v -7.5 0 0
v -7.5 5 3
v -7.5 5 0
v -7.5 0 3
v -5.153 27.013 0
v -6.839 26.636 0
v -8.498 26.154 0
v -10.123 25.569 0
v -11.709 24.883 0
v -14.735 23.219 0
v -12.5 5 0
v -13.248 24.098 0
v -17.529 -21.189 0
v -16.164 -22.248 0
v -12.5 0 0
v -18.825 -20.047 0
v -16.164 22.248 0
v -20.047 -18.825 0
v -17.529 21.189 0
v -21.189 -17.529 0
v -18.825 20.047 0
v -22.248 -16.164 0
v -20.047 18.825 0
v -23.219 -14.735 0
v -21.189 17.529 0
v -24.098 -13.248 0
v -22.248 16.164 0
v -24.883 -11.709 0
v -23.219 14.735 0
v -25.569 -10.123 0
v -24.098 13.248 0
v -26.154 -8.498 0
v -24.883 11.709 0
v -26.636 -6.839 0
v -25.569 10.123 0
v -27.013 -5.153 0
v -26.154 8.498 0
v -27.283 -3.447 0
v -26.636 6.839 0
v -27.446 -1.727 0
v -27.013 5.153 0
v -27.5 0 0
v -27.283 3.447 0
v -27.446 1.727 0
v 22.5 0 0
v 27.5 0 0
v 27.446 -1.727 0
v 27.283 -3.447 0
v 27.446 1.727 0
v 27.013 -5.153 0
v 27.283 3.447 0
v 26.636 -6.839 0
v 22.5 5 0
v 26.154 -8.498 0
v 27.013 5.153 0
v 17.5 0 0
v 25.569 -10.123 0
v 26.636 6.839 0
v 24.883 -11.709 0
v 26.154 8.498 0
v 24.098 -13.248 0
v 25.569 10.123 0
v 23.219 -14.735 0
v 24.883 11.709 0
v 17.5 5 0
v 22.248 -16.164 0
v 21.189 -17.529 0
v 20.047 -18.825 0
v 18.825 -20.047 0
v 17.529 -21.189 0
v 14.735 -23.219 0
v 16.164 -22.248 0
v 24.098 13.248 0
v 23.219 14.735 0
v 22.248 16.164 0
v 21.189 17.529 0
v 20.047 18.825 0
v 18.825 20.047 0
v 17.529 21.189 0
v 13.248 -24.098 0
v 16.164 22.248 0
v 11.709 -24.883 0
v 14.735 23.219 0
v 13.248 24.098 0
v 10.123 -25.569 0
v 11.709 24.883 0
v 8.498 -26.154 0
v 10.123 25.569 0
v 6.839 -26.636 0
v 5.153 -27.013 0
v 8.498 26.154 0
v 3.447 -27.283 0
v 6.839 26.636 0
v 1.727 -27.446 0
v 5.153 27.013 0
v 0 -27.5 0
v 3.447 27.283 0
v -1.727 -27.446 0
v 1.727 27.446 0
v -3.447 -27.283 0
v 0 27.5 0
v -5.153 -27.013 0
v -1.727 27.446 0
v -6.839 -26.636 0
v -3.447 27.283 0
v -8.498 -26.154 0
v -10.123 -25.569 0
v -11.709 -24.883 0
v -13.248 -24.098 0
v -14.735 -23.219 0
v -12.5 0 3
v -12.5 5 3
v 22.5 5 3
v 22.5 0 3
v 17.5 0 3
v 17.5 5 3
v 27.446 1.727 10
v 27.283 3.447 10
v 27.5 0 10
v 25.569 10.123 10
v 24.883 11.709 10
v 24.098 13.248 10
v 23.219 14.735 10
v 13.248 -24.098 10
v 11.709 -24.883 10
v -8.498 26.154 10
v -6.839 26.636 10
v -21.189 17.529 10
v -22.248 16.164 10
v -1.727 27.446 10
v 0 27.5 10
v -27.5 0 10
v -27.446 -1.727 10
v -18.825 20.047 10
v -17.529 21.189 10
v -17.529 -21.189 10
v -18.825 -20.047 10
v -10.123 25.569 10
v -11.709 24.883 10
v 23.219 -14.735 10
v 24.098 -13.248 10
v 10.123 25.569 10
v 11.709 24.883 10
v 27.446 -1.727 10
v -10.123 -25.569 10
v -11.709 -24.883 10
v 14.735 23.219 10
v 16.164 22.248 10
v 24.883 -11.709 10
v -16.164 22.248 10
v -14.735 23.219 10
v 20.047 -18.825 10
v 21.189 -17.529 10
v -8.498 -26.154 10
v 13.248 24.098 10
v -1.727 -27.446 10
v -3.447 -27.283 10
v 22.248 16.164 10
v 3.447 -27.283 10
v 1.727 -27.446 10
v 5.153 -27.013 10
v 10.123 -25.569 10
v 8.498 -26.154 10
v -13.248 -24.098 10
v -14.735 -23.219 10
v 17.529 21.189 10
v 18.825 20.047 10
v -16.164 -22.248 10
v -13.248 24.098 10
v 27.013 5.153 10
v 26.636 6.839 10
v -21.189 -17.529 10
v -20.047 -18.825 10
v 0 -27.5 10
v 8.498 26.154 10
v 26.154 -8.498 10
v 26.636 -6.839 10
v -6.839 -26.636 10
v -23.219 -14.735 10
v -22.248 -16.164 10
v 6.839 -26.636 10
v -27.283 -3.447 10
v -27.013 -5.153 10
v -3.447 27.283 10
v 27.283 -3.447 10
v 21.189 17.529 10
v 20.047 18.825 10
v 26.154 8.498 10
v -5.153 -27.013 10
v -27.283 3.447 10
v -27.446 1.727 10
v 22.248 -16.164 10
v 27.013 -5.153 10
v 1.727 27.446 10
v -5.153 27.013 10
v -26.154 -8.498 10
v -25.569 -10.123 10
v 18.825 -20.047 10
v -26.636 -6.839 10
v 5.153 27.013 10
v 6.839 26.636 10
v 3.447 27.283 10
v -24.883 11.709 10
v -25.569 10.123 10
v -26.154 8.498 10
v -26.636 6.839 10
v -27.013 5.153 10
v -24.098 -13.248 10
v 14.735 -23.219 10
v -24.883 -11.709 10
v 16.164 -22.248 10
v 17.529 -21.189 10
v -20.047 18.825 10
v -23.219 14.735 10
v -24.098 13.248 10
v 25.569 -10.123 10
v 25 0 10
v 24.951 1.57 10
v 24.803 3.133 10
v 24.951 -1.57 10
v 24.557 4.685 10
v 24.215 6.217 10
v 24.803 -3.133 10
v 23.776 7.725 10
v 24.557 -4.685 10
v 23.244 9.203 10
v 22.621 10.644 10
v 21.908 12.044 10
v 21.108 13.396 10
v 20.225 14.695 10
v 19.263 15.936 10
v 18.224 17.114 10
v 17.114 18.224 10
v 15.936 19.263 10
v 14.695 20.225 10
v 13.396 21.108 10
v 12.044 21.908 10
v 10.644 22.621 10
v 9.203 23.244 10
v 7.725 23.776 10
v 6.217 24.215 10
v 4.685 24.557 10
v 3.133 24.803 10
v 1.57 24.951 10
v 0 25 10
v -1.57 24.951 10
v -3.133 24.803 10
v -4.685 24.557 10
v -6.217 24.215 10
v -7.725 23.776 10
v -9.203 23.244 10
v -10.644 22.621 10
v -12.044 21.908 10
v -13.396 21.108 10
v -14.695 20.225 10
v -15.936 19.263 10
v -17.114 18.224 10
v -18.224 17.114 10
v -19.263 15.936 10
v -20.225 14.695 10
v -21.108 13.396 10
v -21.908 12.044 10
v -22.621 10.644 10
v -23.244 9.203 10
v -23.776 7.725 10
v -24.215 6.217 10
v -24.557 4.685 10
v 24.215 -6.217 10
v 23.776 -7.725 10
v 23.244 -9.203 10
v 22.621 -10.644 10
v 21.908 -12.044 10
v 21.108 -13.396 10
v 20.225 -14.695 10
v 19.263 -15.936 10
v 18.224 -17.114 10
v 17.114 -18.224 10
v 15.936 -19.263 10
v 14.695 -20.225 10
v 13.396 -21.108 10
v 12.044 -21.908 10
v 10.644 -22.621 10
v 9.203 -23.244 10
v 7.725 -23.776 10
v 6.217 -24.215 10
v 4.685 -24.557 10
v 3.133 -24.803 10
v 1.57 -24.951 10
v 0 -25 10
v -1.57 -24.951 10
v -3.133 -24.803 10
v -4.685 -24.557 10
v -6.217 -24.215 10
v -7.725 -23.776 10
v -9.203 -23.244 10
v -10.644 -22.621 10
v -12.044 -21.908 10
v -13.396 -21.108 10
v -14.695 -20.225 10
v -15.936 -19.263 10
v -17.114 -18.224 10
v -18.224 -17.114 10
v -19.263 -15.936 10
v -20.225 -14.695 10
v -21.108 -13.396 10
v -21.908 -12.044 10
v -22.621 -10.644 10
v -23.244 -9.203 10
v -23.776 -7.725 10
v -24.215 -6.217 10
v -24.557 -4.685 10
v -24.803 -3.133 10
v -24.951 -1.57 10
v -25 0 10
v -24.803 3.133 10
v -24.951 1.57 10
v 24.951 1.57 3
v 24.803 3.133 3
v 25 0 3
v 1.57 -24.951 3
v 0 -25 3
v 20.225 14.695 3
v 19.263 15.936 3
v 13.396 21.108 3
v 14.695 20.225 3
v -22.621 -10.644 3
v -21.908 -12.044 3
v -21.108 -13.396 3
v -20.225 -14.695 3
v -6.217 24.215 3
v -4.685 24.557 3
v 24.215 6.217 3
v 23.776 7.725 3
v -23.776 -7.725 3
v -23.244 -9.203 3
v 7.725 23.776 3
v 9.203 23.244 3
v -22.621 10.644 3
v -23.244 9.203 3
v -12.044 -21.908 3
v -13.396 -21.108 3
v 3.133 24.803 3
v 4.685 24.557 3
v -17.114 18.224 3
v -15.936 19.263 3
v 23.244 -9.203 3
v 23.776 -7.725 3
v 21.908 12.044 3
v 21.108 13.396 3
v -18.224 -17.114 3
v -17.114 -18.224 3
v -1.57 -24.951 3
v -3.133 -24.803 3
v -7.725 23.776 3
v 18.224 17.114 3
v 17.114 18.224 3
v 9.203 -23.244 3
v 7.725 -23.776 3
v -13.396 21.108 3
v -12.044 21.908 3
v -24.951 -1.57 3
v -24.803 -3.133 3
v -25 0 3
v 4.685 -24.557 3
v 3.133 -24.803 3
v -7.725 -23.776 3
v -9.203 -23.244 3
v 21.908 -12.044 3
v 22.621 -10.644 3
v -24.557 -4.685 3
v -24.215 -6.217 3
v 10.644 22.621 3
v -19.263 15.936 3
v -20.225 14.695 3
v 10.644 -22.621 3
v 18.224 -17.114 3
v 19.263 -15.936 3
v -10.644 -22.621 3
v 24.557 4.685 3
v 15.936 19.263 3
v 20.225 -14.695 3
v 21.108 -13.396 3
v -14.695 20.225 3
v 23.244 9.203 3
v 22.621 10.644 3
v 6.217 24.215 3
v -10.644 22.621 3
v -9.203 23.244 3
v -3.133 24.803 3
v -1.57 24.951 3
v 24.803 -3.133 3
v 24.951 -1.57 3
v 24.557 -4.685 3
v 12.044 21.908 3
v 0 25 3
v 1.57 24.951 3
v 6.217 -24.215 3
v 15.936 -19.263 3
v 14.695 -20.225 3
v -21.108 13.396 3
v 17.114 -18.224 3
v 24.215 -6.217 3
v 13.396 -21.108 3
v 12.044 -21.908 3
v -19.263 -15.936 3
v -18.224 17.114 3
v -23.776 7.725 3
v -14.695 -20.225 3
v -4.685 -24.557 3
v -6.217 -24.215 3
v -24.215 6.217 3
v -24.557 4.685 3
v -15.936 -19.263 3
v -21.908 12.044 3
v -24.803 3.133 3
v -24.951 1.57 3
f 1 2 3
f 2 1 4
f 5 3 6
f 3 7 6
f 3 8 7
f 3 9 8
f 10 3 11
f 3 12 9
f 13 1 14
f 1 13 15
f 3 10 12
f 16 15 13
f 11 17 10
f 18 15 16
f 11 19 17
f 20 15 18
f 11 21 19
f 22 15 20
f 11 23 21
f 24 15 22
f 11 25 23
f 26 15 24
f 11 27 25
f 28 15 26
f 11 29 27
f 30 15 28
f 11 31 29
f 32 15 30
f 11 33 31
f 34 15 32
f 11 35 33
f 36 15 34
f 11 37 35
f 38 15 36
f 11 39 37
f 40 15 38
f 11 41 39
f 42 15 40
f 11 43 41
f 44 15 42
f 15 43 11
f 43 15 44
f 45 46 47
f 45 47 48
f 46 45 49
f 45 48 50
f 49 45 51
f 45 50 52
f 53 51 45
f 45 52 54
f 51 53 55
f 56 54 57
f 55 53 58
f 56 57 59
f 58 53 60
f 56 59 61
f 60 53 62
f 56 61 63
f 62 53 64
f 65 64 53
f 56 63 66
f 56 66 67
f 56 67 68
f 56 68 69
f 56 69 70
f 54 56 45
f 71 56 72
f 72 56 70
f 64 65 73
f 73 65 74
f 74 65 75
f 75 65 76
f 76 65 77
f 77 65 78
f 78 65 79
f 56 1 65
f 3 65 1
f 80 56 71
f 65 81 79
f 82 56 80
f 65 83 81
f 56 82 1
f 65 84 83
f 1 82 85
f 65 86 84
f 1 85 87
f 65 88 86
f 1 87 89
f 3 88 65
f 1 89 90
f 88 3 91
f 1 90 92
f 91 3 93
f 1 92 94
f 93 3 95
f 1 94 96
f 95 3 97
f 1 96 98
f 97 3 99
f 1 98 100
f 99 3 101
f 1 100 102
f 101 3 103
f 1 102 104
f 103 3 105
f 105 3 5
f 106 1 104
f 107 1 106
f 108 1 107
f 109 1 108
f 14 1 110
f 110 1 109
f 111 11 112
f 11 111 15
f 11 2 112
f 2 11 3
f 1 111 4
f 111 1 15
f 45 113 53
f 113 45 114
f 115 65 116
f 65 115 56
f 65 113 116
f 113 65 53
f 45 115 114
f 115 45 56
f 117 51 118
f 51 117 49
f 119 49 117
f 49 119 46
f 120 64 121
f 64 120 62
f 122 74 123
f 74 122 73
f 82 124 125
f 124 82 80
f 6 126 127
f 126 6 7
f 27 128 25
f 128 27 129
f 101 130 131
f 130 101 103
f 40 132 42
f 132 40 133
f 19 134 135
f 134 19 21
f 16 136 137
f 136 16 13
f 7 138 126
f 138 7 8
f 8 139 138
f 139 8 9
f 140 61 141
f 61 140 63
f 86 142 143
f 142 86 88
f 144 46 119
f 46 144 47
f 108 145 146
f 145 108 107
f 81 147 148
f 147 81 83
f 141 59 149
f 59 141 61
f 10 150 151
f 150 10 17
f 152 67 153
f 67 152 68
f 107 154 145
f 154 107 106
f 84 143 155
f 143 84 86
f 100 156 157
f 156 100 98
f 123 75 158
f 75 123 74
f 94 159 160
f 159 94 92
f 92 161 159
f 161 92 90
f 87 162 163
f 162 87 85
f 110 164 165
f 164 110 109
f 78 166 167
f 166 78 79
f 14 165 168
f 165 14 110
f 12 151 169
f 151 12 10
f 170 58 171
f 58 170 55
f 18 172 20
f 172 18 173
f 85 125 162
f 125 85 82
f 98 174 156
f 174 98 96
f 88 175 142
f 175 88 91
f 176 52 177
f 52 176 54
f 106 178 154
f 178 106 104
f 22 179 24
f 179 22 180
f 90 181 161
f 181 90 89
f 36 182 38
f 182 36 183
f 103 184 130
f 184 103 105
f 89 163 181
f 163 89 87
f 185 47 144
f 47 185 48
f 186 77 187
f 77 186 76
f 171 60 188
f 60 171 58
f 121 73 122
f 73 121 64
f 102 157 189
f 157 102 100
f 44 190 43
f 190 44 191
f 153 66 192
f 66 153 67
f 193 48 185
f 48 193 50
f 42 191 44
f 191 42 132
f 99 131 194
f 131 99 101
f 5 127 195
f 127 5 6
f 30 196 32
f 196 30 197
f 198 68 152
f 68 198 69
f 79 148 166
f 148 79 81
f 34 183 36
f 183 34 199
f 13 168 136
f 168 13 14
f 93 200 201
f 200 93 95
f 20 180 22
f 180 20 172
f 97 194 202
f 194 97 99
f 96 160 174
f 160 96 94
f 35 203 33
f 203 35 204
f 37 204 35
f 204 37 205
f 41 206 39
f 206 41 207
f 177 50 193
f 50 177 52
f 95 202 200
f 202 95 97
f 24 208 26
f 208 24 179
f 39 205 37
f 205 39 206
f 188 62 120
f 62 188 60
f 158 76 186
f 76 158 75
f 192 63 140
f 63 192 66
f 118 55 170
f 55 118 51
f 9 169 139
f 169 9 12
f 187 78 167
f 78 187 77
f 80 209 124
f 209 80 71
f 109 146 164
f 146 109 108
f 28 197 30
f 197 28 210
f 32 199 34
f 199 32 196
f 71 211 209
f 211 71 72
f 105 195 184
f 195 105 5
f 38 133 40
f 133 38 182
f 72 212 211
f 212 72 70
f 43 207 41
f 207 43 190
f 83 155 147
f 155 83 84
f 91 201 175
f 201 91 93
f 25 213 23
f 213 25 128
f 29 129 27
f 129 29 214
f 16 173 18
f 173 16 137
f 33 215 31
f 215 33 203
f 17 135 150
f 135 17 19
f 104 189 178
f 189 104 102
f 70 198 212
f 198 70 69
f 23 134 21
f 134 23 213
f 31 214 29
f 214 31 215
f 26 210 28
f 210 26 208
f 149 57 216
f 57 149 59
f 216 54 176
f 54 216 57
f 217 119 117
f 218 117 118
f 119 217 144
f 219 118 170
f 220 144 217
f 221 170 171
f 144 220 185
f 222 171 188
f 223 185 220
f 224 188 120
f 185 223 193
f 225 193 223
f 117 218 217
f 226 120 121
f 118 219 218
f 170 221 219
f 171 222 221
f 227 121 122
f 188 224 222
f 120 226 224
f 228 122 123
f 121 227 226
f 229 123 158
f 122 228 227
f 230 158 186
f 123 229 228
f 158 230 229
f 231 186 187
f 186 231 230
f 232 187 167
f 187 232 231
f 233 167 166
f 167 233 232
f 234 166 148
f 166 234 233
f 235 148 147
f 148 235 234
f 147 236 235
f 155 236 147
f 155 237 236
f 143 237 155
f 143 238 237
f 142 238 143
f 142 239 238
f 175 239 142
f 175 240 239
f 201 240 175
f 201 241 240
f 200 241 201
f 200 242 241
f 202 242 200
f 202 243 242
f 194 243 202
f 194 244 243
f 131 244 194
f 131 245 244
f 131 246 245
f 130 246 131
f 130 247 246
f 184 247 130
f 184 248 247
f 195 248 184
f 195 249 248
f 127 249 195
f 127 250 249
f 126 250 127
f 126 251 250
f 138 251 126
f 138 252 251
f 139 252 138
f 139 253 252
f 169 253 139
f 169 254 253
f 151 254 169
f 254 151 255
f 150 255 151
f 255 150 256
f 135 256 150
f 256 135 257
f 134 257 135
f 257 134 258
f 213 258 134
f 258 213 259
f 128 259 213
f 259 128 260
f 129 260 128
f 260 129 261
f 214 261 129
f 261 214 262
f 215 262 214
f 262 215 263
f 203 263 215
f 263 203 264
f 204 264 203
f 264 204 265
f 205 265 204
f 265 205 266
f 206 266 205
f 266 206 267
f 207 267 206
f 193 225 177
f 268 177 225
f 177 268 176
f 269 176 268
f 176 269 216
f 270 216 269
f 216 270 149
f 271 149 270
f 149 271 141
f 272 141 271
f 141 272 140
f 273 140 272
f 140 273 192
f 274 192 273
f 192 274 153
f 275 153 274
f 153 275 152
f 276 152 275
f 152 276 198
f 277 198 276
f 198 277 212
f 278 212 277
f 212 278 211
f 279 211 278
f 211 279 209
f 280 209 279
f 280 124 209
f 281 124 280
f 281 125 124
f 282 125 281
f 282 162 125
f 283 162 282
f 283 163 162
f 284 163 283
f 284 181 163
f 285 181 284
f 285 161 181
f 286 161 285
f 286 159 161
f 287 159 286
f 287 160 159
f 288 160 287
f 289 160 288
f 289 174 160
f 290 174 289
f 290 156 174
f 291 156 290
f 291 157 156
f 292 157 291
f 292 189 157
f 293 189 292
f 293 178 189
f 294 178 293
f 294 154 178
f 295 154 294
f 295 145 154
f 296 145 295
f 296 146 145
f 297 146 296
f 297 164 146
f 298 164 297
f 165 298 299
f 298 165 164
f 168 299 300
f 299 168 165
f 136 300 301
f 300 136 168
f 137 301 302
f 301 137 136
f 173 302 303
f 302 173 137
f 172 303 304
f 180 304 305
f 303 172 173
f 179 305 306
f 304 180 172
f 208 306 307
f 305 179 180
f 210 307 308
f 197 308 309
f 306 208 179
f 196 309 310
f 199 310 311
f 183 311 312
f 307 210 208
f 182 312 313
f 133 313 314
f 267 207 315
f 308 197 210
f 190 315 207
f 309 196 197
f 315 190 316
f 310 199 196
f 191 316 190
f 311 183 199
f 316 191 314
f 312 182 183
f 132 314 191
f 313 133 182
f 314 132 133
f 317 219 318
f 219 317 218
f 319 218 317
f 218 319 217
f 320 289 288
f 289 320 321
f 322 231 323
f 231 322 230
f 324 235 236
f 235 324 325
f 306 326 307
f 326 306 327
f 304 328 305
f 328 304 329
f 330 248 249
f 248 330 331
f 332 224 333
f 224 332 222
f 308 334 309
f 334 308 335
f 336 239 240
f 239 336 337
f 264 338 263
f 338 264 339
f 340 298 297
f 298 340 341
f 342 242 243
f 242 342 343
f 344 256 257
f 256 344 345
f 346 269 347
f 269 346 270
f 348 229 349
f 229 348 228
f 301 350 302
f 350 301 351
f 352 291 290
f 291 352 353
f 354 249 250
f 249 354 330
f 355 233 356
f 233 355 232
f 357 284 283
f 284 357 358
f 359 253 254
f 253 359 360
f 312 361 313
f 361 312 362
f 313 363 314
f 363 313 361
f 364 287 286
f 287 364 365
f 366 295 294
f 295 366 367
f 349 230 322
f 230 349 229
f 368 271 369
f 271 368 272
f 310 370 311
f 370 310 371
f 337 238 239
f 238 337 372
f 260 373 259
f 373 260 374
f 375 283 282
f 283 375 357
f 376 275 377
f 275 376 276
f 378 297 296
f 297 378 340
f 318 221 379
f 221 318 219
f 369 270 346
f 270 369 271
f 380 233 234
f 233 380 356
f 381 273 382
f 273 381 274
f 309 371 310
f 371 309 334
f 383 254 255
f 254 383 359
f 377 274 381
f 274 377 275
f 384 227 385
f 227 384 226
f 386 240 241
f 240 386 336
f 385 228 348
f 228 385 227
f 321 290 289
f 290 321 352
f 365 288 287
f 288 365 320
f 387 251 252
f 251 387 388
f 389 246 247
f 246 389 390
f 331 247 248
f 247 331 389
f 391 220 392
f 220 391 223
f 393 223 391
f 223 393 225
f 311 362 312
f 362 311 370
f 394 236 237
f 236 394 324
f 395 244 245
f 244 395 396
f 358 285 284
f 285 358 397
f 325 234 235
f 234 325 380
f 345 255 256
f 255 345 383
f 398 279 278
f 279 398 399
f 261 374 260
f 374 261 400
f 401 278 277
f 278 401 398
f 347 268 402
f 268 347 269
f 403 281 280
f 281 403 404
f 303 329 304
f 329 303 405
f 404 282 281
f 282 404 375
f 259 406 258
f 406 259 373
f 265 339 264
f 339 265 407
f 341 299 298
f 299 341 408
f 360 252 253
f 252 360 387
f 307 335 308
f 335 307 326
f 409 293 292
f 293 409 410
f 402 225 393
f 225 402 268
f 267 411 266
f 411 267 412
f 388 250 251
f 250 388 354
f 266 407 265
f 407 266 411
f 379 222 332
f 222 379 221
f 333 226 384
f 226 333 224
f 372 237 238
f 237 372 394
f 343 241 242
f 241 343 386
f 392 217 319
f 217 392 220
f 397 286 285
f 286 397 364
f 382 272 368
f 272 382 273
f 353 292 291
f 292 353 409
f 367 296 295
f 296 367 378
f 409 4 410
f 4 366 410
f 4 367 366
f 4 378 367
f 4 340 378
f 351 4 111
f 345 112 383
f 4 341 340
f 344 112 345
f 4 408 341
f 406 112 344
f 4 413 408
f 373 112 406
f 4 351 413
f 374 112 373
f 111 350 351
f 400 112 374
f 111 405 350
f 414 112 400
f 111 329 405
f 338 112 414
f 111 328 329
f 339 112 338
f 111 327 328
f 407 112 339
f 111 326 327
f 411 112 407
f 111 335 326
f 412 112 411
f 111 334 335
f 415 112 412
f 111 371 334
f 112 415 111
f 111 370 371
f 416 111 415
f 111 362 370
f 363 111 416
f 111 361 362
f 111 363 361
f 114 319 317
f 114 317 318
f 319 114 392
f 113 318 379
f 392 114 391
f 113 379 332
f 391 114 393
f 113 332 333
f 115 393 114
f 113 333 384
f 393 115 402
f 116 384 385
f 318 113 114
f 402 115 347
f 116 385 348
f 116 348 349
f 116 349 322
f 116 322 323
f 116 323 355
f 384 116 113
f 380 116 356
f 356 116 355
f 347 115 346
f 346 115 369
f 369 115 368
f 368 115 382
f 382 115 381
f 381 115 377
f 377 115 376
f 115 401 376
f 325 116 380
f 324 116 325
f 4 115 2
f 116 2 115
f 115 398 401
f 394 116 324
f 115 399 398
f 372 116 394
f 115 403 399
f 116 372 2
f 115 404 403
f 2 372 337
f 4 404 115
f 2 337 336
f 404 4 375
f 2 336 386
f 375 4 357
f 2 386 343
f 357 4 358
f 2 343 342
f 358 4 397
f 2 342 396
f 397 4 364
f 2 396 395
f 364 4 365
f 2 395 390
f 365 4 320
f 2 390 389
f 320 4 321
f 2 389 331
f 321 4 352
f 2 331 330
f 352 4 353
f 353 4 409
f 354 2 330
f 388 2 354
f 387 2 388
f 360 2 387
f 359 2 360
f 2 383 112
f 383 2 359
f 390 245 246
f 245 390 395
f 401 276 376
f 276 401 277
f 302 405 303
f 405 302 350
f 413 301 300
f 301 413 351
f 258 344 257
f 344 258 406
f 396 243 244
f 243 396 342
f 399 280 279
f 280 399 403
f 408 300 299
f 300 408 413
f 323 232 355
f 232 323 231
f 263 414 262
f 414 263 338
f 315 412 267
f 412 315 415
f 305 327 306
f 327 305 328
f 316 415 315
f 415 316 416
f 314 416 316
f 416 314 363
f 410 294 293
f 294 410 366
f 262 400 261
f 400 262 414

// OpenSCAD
// file: utils/triangle_system.scad
//triangle_tube(20, 5, 5);
module triangle_tube(height,radius,wall)
{
  tubify(radius,wall) triangle_prism(height,radius);
}

//Tubifies any regular prism
module tubify(radius,wall)
{
  difference()
  {
    children(0);
    translate([0, 0, -0.1]) scale([(radius-wall)/radius, (radius-wall)/radius, 2]) children(0);
  }
}

module triangle_prism(height,radius)
{
  linear_extrude(height=height) triangle(radius);
}

module triangle(radius)
{
  o=radius/2;		//equivalent to radius*sin(30)
  a=radius*sqrt(3)/2;	//equivalent to radius*cos(30)
  polygon(points=[[-a,-o],[0,radius],[a,-o]],paths=[[0,1,2]]);
}
// main file
/**
 * Info TODO
 * Interzonas.info create piece mishtohit
 **/

//utils triangle suport piece
include <utils/triangle_system.scad>;

//Const cylinder
cylinder_dim = 27.5;
height = 10;

//hole cones
pathRadius=25/2;
num=2;


/**
* Init the piece
**/
main();
module main() {
  difference() {
    cylinder_base(cylinder_dim, height);
    translate([0, 0, 3]) {
      cylinder_base(cylinder_dim-2.5, height);
    }
    cylinder_hole_creator(pathRadius, num, height);
    //tabs(pathRadius, num, height);
  }
}


/**
* Modulo create triagle support
* Params Distence bwteeen of support, num of support, height of support
**/
module cylinder_hole_creator(distancia, numero, alt) {
  triangle_data = [10.5, 5.3, 5.3, -90];
  for (i=[1:numero])  {
    translate([distancia*cos(i*(360/numero)),distancia*sin(i*(360/numero)),0]){
      if(i == 1){
        colores = "red";
        color(colores) {
          cube(size=[5, 5, height]);
        }
      } else {
        colores = "green";
        color(colores) {
          translate([5, 0, 0]) {
            cube(size=[5, 5, height]);
          }
        }
      }
    }
  }
}

/**
* Modulo create tabs of cap
**/
module tabs(distancia, numero, alt) {
  tabs_dimensions = [4, 10, 2.5];
  position = [-7.5, -5, 2];
  position_x = position[0];
  position_x_opos = abs(position_x) / 2;
  for (i=[1:numero])  {
    translate([distancia*cos(i*(360/numero)),distancia*sin(i*(360/numero)),0]){
      if(i == 1){
        translate([-7.5, -5, 2]) {
          cube(size=tabs_dimensions);
        }

      } else {
        translate([position_x_opos, position[1], position[2]]) {
          cube(size=tabs_dimensions);
        }

      }
    }
  }
}

/**
* Modulo  cylinder base
**/
module cylinder_base(diamentro, height) {
  cylinder(r=diamentro, h=height, $fn=100);
}

module triangle_base(height, radio_exterior, radio_interior, rotate_angle){
  rotate(rotate_angle){
    triangle_tube(height, radio_exterior, radio_interior);
  }
}
